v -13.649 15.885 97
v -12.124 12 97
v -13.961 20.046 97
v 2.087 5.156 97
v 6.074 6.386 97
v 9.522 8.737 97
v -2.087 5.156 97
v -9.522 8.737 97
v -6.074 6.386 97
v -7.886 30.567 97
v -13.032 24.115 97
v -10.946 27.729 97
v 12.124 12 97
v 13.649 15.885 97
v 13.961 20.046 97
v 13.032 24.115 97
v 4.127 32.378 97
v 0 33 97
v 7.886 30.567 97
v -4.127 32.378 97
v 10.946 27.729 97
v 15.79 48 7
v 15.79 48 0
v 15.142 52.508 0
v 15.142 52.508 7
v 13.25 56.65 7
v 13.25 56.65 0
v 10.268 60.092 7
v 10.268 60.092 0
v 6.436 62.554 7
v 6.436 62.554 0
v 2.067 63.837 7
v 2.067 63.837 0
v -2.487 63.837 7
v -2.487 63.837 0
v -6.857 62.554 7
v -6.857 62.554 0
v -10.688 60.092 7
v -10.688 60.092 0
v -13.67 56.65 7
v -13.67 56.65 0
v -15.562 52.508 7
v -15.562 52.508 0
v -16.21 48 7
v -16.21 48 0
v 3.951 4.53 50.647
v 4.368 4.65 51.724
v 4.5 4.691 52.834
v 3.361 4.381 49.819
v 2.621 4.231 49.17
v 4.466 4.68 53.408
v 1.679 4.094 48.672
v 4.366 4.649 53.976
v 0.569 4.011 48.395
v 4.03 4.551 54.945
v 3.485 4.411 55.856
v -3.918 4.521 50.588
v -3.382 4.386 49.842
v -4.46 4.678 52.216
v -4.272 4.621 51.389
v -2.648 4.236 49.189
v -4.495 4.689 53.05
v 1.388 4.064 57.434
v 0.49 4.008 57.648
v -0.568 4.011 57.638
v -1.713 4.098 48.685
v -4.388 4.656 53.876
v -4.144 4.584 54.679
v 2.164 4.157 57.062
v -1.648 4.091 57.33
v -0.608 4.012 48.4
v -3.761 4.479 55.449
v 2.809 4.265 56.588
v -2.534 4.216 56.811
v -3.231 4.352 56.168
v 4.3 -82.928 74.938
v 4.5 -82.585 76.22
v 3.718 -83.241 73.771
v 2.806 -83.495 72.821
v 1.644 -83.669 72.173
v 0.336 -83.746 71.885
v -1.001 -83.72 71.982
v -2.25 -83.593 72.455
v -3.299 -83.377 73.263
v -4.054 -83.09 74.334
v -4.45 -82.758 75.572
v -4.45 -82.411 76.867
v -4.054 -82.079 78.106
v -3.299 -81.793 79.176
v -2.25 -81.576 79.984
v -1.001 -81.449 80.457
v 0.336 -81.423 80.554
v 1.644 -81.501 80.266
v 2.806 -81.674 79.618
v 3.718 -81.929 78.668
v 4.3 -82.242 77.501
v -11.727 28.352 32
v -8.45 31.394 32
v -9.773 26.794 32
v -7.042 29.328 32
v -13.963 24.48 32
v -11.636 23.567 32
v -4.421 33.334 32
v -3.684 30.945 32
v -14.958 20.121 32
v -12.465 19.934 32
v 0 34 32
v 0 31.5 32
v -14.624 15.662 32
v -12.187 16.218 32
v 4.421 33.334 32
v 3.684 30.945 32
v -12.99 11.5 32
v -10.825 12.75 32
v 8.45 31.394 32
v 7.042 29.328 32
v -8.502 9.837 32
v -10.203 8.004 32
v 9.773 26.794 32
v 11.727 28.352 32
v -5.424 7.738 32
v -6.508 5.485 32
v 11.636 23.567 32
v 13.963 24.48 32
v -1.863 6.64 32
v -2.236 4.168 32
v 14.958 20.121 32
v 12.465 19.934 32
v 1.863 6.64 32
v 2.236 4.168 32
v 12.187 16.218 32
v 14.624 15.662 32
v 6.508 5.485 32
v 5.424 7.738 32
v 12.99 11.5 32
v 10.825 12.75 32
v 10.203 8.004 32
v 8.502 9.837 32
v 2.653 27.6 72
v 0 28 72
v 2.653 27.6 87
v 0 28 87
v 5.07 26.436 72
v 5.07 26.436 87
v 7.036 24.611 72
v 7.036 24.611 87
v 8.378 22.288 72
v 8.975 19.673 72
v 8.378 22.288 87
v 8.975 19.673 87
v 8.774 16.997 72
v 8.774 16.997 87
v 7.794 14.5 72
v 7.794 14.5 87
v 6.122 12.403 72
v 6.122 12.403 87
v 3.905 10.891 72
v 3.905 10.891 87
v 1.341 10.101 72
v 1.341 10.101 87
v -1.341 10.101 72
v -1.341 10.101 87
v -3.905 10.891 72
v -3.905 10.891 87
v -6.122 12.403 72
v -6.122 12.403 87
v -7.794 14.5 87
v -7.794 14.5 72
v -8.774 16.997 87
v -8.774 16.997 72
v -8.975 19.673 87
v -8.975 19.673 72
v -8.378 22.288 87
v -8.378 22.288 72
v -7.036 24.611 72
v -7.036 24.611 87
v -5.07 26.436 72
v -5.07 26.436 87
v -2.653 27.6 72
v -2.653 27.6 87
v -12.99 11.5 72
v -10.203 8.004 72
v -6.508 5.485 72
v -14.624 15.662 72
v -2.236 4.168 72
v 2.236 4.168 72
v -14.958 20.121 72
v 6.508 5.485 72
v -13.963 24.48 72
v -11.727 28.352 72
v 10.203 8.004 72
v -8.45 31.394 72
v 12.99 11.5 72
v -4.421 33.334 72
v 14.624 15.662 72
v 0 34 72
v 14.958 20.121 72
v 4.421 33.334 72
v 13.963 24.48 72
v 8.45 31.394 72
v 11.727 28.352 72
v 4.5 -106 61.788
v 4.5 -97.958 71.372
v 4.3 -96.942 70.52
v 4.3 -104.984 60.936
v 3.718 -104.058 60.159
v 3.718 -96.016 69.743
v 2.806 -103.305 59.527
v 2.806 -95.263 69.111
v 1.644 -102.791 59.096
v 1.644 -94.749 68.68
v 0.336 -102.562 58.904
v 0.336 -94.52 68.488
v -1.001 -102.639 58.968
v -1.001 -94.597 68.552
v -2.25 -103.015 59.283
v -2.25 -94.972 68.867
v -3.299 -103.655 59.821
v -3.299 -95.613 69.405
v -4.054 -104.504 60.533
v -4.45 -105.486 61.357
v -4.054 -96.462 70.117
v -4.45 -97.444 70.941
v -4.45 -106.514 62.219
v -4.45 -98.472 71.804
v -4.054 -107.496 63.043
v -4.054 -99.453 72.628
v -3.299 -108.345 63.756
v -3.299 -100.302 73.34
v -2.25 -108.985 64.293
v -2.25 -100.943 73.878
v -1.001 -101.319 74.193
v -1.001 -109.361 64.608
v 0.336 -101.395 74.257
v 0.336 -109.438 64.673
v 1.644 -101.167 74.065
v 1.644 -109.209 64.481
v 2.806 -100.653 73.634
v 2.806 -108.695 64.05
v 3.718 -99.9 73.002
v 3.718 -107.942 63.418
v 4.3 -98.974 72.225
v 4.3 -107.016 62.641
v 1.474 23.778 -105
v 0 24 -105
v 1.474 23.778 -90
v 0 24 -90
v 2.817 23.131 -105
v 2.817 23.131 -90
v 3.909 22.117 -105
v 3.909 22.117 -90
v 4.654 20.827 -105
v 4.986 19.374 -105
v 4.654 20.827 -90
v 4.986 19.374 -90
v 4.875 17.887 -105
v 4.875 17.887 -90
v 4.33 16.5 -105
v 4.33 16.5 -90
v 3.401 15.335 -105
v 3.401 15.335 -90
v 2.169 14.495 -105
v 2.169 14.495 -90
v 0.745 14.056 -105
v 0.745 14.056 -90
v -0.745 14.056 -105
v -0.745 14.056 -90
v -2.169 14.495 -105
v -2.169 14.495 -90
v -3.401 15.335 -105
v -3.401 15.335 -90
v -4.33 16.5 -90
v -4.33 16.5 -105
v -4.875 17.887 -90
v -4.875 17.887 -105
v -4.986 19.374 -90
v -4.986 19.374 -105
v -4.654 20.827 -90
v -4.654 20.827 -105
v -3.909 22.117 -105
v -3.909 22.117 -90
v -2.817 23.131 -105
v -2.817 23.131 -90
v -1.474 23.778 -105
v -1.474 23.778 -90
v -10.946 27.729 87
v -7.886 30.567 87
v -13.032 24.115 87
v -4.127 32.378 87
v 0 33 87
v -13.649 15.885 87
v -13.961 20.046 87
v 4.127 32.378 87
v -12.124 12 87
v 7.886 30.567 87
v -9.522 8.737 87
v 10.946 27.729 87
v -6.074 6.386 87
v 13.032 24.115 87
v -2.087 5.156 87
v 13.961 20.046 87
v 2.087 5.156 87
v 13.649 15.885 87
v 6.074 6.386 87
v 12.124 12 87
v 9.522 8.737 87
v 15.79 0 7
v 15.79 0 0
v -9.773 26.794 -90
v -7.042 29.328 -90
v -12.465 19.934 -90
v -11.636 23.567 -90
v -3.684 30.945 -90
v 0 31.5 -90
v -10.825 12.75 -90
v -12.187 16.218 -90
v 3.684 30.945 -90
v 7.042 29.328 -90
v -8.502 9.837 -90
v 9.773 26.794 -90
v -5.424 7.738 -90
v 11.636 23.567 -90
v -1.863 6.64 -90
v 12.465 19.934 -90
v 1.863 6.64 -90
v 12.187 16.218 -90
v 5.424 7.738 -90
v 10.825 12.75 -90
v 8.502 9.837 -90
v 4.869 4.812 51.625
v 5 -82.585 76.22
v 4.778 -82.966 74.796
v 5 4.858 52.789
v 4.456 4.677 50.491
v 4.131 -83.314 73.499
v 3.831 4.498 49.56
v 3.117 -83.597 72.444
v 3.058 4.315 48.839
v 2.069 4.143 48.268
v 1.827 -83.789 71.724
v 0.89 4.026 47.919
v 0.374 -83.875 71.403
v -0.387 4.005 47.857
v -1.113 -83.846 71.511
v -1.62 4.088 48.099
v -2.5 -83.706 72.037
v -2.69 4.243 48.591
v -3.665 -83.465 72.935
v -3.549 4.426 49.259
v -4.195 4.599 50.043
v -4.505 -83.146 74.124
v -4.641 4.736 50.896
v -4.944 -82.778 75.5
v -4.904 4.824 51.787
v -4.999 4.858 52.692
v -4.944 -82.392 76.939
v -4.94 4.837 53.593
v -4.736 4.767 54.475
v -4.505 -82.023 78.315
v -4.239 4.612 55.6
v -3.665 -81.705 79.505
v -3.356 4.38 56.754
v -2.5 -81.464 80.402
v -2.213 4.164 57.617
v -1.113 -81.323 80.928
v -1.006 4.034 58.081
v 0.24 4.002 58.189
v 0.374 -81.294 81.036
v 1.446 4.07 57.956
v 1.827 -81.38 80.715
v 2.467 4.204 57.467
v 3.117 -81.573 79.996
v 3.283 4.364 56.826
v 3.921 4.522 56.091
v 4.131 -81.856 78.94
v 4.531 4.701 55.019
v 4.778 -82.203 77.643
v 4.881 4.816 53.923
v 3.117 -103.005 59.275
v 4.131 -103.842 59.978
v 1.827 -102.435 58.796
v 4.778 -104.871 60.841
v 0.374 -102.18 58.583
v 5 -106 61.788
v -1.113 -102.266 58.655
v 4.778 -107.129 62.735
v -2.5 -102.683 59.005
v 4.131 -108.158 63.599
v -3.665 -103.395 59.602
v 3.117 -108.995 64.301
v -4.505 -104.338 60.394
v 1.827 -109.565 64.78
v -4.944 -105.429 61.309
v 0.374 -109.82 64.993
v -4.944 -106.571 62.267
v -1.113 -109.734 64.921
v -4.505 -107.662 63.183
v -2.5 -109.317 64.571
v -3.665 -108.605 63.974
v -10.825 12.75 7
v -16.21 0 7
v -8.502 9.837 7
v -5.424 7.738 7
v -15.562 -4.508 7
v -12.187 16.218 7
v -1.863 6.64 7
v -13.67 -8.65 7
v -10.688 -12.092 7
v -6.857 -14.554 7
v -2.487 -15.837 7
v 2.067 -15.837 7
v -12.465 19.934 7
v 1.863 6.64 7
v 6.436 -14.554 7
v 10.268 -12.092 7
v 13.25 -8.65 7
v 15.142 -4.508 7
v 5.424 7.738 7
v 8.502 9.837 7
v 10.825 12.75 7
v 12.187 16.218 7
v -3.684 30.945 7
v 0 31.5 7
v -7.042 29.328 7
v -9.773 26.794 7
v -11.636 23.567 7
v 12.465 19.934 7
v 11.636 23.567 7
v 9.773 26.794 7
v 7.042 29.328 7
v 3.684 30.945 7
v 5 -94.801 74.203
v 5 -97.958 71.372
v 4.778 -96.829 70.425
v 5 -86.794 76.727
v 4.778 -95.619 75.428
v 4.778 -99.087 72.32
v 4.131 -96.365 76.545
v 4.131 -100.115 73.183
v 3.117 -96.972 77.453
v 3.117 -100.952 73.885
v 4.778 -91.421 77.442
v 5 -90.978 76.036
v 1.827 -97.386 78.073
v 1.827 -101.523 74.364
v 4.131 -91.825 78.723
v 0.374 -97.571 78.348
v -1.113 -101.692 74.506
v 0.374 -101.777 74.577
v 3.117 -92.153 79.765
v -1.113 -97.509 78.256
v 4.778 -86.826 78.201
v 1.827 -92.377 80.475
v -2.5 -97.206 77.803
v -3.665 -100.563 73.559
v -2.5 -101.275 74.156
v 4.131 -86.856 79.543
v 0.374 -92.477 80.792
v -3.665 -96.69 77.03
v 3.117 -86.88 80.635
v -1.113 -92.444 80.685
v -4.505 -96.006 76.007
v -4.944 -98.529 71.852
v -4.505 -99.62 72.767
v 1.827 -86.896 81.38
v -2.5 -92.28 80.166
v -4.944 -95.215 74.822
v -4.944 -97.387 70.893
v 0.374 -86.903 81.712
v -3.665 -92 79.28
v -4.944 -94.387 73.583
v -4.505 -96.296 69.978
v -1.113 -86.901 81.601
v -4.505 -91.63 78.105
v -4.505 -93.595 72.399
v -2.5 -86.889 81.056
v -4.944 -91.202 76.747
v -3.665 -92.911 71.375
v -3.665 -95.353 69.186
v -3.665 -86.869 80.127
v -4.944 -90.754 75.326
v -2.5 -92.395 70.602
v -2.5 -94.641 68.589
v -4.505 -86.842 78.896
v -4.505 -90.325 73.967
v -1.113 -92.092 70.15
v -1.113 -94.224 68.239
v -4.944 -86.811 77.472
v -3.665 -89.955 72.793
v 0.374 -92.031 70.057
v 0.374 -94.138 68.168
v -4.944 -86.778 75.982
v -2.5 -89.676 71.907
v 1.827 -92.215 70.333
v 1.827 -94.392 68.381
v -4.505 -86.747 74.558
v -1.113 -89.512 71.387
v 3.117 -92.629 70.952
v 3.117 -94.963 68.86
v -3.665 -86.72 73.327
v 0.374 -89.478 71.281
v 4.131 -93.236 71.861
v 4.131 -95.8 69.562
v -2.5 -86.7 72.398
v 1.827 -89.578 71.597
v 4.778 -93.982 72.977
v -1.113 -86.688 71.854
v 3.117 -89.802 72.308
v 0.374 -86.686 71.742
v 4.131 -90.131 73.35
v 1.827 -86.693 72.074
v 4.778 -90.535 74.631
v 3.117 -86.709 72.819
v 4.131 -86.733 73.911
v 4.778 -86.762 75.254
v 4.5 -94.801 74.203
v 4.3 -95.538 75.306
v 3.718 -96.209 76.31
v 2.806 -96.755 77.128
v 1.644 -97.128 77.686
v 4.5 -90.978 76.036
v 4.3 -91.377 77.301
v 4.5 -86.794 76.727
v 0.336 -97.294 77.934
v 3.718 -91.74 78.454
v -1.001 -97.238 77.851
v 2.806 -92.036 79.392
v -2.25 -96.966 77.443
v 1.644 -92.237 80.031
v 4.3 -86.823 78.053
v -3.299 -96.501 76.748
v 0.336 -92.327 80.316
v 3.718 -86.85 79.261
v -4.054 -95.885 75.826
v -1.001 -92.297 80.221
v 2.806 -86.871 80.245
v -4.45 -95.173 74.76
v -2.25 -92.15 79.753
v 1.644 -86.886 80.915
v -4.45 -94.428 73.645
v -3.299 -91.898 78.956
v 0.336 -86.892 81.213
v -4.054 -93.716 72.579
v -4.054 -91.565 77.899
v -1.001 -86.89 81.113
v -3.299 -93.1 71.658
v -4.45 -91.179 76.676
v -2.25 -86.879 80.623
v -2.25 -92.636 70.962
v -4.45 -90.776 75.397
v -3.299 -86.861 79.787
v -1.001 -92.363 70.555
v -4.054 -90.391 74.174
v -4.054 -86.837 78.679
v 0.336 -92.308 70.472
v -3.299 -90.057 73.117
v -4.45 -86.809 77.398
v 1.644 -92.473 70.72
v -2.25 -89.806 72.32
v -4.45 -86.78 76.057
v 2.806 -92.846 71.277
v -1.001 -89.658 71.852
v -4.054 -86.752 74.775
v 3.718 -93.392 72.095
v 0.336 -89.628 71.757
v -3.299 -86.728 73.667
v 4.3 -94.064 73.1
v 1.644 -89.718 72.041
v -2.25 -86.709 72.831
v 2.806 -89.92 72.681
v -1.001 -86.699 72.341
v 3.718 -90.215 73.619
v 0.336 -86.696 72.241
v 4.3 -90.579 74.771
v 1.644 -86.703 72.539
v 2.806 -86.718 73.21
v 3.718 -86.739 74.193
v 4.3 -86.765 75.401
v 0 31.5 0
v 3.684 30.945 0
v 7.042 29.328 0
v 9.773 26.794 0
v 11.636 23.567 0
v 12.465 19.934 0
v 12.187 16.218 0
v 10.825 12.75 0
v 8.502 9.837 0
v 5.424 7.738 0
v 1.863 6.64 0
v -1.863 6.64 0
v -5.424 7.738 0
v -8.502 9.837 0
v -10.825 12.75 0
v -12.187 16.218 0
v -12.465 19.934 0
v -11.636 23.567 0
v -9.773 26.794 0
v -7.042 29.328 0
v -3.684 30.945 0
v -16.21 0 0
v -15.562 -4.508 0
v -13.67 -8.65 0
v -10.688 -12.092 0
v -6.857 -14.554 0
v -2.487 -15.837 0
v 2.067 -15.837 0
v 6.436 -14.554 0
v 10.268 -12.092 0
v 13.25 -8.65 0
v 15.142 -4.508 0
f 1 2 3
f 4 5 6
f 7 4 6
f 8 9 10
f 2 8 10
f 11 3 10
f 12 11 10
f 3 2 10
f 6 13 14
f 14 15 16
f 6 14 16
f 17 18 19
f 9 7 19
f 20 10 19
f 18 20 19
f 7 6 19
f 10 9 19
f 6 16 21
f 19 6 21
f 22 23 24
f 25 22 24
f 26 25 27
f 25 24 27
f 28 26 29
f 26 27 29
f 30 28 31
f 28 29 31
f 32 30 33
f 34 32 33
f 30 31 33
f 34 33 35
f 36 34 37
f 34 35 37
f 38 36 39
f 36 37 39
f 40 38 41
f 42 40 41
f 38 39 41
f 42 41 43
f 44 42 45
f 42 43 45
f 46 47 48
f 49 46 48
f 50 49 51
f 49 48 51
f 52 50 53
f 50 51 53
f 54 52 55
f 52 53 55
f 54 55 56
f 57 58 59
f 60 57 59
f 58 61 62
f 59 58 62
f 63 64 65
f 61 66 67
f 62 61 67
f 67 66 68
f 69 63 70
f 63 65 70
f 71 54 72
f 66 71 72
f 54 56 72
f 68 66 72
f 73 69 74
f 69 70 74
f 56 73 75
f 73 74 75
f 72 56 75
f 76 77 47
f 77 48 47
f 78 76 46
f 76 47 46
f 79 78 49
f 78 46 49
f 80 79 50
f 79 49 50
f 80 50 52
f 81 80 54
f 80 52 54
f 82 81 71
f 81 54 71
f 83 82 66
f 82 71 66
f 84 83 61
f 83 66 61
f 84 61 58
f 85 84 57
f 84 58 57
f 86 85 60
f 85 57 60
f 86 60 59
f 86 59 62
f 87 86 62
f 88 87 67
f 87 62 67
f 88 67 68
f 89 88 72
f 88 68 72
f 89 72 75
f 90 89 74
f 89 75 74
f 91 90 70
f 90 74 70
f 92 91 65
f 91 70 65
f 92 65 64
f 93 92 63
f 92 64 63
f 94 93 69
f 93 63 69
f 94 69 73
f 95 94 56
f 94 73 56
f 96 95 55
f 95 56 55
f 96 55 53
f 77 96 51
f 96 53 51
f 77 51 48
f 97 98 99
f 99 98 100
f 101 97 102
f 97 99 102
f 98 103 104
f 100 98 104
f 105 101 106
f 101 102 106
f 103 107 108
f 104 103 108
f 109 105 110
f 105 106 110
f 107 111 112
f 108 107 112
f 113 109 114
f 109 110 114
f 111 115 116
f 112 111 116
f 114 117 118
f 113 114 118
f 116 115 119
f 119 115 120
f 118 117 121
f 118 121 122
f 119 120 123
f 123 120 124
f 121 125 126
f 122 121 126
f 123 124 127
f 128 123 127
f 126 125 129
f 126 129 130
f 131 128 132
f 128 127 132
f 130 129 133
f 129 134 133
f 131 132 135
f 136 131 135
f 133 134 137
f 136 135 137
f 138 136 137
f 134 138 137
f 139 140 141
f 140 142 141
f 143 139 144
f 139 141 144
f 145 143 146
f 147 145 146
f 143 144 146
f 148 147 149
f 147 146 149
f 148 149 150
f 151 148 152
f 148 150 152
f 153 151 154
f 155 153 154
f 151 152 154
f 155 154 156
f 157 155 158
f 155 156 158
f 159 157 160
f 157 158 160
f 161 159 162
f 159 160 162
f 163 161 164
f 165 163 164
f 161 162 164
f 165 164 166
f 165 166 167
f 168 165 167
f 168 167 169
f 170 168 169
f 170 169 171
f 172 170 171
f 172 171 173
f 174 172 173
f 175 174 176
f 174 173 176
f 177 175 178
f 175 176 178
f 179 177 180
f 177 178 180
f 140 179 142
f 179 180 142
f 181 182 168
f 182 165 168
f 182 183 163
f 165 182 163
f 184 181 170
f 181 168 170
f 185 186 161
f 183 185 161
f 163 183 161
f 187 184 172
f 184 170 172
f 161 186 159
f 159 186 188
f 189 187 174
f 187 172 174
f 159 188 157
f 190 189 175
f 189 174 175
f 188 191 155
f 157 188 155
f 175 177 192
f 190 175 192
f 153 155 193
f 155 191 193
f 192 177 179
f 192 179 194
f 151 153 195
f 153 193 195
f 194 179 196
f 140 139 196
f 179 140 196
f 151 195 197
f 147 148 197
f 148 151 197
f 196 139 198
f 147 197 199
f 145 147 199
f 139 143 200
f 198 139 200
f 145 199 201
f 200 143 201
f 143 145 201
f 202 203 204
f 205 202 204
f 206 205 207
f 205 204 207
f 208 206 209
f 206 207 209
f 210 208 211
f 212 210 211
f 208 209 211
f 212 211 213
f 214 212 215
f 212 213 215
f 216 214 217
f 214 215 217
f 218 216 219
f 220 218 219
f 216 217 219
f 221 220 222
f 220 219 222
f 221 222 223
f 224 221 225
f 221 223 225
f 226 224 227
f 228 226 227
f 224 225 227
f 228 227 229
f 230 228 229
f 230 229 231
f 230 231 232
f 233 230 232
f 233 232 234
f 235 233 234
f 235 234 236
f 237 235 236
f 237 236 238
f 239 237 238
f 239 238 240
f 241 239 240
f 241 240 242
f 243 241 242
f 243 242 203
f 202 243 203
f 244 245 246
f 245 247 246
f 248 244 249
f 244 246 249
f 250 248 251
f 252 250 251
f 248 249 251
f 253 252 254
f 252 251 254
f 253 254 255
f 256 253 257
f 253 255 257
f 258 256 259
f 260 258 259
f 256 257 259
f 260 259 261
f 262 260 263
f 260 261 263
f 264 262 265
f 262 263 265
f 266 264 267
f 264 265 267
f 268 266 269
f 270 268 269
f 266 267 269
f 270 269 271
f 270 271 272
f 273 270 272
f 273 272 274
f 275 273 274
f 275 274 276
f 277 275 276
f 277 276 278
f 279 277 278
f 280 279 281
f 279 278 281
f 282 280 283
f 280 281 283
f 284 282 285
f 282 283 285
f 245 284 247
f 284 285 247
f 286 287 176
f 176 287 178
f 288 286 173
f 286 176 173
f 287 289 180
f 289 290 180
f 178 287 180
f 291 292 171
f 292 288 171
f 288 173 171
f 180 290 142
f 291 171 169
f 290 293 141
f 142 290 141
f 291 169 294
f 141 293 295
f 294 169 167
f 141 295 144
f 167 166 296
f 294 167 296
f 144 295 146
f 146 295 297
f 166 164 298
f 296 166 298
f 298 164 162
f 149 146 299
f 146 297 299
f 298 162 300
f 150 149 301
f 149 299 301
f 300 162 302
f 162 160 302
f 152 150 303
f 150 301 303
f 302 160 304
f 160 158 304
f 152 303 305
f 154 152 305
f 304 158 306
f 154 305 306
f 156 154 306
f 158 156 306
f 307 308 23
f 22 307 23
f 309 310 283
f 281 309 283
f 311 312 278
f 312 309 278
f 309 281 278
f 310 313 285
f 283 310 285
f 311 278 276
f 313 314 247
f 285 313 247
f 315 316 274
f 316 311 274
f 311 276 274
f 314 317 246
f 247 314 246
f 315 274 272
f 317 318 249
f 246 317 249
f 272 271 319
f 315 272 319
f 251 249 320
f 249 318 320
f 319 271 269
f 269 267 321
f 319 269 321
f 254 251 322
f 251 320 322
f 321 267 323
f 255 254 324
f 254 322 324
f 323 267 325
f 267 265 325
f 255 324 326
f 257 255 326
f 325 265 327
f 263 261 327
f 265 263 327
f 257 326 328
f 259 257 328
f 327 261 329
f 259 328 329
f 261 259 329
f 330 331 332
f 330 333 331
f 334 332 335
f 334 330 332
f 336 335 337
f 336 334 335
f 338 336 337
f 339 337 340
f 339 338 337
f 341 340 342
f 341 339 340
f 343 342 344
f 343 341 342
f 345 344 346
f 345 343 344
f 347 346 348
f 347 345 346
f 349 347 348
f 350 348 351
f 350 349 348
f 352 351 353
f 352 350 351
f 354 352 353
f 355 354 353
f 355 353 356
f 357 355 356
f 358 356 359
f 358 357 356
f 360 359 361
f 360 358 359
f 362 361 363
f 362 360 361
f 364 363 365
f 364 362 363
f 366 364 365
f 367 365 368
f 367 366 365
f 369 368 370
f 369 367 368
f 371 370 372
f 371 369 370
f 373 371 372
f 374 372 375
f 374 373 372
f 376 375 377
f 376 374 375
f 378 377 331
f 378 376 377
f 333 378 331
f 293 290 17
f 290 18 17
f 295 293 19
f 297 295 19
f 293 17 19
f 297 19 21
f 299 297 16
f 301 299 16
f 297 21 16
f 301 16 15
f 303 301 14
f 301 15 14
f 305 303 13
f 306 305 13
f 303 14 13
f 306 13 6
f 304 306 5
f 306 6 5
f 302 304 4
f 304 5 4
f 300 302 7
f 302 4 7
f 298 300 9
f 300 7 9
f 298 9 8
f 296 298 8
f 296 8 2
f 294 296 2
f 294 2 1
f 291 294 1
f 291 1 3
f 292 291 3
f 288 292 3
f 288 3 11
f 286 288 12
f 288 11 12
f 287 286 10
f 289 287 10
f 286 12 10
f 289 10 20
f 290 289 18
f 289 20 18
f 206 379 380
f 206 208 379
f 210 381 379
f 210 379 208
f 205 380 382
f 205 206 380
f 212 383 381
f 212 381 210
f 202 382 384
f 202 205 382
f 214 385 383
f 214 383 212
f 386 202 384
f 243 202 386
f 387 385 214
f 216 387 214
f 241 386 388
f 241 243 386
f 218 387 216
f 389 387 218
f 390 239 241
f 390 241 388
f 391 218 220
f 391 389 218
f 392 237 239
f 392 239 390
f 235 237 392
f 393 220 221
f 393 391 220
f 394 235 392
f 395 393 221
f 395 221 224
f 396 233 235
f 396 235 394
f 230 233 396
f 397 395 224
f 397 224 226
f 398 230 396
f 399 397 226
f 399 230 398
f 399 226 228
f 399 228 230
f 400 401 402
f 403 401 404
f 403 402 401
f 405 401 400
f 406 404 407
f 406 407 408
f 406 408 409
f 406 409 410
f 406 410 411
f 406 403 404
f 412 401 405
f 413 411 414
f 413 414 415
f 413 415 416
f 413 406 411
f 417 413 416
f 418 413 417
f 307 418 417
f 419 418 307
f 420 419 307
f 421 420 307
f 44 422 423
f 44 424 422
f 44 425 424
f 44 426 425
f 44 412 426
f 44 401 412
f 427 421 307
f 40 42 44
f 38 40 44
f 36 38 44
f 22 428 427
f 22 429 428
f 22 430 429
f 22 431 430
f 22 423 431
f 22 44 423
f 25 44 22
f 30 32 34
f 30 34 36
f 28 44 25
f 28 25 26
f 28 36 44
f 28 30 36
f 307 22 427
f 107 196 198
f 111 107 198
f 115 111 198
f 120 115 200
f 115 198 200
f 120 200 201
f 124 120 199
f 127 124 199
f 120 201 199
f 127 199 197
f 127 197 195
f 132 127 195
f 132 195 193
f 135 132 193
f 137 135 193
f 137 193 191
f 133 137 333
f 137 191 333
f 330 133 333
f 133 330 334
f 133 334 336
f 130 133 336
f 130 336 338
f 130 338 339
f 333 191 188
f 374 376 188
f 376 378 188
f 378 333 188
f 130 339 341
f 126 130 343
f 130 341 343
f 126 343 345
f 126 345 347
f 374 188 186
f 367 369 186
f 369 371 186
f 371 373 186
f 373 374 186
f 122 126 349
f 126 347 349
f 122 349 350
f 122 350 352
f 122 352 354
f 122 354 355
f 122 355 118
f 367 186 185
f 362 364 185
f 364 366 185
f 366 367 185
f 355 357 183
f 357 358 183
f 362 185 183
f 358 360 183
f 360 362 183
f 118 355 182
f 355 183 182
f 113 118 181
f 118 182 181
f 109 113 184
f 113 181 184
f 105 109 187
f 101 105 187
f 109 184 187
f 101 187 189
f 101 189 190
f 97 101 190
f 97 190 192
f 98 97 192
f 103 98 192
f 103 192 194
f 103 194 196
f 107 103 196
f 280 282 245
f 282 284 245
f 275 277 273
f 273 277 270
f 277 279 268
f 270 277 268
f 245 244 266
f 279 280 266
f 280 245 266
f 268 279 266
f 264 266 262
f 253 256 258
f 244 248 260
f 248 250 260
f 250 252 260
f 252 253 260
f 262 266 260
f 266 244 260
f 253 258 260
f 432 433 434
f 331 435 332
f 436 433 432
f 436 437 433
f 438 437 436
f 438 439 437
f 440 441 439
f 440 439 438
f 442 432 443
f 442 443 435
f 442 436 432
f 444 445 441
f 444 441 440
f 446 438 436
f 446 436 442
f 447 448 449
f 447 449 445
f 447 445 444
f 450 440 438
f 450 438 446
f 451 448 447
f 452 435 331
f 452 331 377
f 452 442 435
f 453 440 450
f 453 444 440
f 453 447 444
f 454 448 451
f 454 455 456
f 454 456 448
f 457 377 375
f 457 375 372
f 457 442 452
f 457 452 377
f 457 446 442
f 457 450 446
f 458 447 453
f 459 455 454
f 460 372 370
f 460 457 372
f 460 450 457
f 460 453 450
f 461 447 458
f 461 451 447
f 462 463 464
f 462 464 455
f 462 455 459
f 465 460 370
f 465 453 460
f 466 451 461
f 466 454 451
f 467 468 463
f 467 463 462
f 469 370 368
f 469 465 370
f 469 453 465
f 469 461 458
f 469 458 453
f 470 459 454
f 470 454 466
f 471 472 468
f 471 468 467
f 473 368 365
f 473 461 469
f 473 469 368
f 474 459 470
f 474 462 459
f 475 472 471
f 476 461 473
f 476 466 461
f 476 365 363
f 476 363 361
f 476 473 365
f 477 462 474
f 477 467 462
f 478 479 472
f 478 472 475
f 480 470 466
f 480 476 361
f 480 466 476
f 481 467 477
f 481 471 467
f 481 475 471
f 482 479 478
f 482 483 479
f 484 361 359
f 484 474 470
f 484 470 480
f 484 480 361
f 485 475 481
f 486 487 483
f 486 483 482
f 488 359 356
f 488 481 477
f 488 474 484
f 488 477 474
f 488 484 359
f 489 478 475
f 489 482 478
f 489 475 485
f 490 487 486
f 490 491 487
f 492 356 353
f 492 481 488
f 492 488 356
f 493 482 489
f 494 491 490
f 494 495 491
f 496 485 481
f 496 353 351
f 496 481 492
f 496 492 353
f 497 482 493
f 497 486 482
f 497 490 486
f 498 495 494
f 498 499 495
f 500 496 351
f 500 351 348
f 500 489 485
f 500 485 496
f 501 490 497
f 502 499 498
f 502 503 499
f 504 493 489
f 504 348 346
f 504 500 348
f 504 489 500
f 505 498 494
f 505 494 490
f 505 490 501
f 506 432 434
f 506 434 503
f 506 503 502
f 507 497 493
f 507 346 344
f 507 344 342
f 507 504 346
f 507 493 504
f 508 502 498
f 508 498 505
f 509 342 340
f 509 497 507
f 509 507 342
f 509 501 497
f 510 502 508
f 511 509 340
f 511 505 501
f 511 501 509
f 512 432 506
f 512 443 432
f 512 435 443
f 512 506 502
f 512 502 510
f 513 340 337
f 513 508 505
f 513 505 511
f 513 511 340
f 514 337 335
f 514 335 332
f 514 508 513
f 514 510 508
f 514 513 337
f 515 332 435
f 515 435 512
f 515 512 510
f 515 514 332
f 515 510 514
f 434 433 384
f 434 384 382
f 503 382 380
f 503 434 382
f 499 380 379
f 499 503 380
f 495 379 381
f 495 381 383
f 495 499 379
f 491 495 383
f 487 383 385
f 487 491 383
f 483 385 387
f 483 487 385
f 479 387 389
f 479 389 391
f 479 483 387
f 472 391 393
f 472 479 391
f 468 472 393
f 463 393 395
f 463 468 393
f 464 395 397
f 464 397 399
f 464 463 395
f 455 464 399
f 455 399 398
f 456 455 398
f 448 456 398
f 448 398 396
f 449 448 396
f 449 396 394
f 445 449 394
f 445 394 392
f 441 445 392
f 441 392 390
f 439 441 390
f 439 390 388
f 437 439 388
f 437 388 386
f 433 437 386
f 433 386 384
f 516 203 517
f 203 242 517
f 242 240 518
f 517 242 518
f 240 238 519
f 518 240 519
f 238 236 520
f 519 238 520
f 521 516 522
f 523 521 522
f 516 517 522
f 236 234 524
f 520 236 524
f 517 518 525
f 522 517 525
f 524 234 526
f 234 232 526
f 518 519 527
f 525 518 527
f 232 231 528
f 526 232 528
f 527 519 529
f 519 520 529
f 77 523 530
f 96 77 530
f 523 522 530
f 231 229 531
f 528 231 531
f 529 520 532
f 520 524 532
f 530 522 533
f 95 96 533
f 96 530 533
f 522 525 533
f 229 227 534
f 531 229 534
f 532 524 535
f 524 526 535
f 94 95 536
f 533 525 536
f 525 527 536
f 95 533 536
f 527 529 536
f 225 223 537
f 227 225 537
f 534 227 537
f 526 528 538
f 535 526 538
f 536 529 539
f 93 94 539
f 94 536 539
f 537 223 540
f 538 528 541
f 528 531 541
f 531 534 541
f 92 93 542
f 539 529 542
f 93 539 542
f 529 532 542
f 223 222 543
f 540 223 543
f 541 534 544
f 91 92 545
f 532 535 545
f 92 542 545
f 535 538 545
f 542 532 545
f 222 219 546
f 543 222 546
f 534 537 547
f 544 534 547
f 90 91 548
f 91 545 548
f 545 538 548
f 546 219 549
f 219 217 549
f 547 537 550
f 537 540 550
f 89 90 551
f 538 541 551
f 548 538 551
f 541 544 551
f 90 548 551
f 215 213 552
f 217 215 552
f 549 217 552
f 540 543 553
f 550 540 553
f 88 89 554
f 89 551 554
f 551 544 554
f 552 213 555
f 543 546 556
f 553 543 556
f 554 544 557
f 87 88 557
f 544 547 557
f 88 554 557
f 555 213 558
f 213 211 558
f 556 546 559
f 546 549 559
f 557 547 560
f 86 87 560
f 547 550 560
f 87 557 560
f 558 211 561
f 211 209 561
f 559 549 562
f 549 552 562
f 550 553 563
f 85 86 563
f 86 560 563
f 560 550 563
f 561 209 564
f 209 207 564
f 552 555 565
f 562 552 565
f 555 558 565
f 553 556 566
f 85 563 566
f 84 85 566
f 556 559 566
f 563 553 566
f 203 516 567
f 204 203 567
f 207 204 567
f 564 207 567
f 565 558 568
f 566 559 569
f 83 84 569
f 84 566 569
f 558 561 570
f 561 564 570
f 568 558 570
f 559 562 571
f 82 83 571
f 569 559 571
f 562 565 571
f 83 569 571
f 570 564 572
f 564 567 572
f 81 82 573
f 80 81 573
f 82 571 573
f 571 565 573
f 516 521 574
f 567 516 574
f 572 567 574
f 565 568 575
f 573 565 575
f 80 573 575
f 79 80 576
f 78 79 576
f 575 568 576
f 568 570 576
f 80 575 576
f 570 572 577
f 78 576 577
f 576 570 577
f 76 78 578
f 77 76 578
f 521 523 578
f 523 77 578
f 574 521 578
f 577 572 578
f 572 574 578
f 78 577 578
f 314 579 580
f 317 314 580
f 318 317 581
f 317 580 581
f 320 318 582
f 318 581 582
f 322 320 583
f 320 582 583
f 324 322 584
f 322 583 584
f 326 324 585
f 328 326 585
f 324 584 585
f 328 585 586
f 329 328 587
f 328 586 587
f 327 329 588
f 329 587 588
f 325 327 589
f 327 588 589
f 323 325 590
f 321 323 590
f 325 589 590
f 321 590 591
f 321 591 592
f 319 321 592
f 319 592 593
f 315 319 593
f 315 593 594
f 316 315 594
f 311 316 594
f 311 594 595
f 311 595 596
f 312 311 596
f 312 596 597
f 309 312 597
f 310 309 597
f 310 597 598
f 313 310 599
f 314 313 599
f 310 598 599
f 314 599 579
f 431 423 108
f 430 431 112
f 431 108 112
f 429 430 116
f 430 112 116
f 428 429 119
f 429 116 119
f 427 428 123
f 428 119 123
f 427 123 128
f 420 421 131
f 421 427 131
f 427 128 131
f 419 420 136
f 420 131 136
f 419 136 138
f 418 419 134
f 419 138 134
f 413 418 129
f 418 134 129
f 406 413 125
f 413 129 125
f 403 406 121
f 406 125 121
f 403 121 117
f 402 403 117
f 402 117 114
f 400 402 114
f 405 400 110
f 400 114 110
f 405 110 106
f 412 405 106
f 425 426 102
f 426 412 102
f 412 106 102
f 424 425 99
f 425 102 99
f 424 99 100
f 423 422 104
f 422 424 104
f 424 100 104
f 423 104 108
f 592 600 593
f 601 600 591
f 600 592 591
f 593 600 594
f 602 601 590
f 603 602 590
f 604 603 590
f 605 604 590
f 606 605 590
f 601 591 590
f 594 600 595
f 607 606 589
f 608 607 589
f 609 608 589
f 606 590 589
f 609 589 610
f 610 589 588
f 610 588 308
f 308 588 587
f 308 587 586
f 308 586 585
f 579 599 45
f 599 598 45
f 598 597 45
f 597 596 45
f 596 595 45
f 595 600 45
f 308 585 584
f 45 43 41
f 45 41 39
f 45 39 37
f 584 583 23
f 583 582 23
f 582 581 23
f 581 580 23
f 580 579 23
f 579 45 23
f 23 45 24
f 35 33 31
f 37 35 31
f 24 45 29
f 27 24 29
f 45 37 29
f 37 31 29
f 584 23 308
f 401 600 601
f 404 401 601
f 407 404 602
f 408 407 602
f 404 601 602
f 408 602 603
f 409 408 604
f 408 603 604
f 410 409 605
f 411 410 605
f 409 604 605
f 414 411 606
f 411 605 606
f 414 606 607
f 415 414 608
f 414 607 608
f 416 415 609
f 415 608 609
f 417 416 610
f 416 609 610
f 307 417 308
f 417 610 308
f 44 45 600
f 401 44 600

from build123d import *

# Parameters (mm, degrees)
F1_DEPTH = 7
F6_R     = 5
F6_R_2   = 4.5


with BuildPart() as f1:
    # F0 (on Top) → F1 (new body)
    with BuildSketch(Plane.XY):
        with BuildLine():
            Line((-16.2101432325, 48), (-16.2101432325, 0))
            ThreePointArc((-16.2101432325, 0), (-0.2101432325, -16), (15.7898567675, 0))
            Line((15.7898567675, 0), (15.7898567675, 48))
            ThreePointArc((15.7898567675, 48), (-0.2101432325, 64), (-16.2101432325, 48))
        make_face()
    extrude(amount=F1_DEPTH)

    # F2 (on Right) → F3 (revolve)
    with BuildSketch(Plane.YZ):
        Polygon((33, 97), (19, 97), (19, -105), (24, -105), (24, -90), (31.5, -90), (31.5, 32), (34, 32), (34, 72), (28, 72), (28, 87), (33, 87), align=None)
    revolve(axis=Axis((0, 19, -4), (0, 0, -1)))

    # F7: sweep along a path in F4
    with BuildLine(Plane.YZ) as f7_path:
        Line((-106, 61.7881254457), (-97.95775995, 71.3724939178))
        ThreePointArc((-97.95775995, 71.3724939178), (-90.9776802958, 76.0364340337), (-82.5848076267, 76.2195671668))
        Line((-82.5848076267, 76.2195671668), (19, 49))
    # F6 (on line) → F7 (sweep)
    with BuildSketch(Plane(origin=(0, -13.3719340922, -15.9360504943), x_dir=(1, 0, 0), z_dir=(0, -0.6427876097, -0.7660444431))):
        with Locations((0, 120.9173524329)):
            Circle(F6_R)
        with Locations((0, 120.9173524329)):
            Circle(F6_R_2, mode=Mode.SUBTRACT)
    sweep(path=f7_path.line)


solid = f1.part
